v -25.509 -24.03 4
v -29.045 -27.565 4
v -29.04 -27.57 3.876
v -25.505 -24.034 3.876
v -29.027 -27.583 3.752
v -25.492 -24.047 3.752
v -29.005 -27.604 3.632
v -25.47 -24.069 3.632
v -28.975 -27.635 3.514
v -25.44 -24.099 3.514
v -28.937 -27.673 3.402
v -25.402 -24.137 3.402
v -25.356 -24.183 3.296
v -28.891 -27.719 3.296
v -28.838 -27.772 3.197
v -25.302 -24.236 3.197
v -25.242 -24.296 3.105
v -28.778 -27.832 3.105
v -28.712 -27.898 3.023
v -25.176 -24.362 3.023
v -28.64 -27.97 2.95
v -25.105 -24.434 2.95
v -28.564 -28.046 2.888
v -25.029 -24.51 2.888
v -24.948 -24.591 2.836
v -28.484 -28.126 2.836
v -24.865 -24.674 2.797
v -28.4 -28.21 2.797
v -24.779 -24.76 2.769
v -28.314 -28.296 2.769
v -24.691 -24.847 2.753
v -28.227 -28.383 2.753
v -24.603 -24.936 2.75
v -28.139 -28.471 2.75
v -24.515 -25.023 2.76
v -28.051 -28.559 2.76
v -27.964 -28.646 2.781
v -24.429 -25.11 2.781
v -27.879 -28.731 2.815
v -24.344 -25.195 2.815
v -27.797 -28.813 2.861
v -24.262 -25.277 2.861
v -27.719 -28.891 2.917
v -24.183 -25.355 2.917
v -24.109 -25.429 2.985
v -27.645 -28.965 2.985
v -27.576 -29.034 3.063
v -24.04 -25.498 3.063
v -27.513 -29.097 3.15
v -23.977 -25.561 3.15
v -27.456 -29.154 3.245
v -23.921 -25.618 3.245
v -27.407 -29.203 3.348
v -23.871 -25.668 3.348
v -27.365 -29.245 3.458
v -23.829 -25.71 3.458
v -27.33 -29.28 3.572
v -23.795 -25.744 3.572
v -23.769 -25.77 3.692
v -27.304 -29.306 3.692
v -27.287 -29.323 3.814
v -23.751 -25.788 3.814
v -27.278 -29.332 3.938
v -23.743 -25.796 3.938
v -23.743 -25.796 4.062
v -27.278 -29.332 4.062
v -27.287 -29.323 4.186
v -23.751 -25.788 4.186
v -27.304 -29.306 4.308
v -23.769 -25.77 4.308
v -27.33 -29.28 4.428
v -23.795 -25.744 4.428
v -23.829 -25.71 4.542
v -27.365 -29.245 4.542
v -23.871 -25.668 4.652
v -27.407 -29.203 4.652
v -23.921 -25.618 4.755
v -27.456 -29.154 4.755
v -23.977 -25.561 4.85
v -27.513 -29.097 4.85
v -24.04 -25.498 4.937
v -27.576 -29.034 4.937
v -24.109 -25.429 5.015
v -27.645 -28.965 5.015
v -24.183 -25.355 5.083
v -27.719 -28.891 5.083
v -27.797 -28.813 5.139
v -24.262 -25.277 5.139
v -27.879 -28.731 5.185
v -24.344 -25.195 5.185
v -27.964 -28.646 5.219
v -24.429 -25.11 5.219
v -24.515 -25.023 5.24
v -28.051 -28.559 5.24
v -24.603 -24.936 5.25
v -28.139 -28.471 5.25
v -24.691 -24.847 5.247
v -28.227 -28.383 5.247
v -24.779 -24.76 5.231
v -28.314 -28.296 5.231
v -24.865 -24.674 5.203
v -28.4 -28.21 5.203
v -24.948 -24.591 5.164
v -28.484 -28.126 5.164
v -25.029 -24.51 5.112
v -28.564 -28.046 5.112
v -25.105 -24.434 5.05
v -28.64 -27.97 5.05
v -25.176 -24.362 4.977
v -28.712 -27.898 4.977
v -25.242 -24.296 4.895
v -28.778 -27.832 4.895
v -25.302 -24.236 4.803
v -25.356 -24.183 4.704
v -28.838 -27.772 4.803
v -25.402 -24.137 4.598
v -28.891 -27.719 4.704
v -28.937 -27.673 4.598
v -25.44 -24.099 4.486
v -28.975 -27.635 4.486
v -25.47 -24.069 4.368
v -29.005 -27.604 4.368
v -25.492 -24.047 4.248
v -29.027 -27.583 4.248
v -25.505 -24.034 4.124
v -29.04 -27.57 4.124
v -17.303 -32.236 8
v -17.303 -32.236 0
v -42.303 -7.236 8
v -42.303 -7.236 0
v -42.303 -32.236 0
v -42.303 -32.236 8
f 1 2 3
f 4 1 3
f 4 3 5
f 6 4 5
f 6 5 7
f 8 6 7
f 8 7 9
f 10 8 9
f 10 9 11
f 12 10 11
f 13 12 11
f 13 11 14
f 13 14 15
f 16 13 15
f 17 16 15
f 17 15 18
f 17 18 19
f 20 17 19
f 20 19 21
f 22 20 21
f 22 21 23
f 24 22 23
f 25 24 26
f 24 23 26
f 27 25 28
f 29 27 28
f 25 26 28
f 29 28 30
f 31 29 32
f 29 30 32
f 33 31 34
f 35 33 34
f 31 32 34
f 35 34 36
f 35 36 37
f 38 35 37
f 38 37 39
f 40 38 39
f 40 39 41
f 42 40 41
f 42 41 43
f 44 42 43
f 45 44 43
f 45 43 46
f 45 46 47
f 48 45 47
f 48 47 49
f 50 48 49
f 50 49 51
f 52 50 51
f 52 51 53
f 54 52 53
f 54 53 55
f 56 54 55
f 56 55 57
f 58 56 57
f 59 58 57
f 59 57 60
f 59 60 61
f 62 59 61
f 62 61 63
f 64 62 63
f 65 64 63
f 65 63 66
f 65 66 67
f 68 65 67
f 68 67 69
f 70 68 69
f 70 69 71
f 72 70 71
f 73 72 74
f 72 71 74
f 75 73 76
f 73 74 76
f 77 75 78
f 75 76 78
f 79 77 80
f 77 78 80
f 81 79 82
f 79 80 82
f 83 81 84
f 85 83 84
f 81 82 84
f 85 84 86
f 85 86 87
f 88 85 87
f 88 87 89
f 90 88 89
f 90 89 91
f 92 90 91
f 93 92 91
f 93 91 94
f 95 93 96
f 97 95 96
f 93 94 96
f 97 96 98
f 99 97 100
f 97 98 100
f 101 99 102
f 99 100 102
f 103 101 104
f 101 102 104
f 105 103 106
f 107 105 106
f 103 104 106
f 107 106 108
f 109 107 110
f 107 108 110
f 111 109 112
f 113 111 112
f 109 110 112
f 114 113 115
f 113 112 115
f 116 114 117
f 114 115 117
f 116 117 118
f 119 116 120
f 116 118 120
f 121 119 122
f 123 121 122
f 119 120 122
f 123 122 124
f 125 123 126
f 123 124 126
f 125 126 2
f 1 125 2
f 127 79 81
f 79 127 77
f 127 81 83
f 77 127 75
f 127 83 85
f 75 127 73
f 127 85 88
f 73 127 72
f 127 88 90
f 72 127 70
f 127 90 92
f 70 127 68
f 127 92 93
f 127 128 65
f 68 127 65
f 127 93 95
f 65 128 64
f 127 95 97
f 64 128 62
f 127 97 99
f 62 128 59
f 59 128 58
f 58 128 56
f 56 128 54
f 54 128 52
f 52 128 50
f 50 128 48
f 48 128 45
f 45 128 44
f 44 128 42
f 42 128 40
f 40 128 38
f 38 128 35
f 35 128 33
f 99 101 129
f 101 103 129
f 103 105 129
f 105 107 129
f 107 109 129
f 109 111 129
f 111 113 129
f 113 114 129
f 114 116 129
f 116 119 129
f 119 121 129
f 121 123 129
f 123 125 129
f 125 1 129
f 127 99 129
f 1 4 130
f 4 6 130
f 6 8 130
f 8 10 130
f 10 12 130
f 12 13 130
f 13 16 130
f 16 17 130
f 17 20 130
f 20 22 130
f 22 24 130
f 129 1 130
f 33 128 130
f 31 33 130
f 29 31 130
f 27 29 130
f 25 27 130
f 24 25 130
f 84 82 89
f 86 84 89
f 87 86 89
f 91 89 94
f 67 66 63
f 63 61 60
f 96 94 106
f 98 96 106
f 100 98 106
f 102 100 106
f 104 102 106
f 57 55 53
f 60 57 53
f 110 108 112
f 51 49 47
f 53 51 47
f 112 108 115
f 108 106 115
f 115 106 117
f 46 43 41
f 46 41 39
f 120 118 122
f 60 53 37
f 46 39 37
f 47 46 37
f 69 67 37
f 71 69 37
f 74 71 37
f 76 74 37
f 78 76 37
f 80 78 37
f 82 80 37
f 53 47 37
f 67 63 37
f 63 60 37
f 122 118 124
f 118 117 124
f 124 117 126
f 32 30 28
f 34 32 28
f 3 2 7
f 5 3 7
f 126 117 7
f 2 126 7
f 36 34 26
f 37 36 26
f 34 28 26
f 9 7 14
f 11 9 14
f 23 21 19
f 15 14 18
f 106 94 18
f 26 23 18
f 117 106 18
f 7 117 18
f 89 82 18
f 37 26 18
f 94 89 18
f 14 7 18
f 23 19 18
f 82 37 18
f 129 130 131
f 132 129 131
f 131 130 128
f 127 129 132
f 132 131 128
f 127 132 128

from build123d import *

# Parameters (mm, degrees)
EXTRUDE_2_DEPTH        = 8
HOLE_WIZARD_M3_2_D     = 2.5
HOLE_WIZARD_M3_2_DEPTH = 5


with BuildPart() as part:
    # 草图1 → 凸台-拉伸2 (new body)
    with BuildSketch(Plane.XY):
        Polygon((-42.3029947, -7.235847593), (-42.3029947, -32.235847593), (-17.3029947, -32.235847593), align=None)
    extrude(amount=EXTRUDE_2_DEPTH)

    # M3 螺纹孔2
    with Locations(Plane(origin=(-24.769421146, -24.769421146, 0), x_dir=(0.7071067811865439, -0.7071067811865511, 0), z_dir=(0.7071067811865511, 0.7071067811865439, 0))):
        with Locations((0.203782484, -4)):
            Hole(HOLE_WIZARD_M3_2_D / 2, depth=HOLE_WIZARD_M3_2_DEPTH)


solid = part.part
